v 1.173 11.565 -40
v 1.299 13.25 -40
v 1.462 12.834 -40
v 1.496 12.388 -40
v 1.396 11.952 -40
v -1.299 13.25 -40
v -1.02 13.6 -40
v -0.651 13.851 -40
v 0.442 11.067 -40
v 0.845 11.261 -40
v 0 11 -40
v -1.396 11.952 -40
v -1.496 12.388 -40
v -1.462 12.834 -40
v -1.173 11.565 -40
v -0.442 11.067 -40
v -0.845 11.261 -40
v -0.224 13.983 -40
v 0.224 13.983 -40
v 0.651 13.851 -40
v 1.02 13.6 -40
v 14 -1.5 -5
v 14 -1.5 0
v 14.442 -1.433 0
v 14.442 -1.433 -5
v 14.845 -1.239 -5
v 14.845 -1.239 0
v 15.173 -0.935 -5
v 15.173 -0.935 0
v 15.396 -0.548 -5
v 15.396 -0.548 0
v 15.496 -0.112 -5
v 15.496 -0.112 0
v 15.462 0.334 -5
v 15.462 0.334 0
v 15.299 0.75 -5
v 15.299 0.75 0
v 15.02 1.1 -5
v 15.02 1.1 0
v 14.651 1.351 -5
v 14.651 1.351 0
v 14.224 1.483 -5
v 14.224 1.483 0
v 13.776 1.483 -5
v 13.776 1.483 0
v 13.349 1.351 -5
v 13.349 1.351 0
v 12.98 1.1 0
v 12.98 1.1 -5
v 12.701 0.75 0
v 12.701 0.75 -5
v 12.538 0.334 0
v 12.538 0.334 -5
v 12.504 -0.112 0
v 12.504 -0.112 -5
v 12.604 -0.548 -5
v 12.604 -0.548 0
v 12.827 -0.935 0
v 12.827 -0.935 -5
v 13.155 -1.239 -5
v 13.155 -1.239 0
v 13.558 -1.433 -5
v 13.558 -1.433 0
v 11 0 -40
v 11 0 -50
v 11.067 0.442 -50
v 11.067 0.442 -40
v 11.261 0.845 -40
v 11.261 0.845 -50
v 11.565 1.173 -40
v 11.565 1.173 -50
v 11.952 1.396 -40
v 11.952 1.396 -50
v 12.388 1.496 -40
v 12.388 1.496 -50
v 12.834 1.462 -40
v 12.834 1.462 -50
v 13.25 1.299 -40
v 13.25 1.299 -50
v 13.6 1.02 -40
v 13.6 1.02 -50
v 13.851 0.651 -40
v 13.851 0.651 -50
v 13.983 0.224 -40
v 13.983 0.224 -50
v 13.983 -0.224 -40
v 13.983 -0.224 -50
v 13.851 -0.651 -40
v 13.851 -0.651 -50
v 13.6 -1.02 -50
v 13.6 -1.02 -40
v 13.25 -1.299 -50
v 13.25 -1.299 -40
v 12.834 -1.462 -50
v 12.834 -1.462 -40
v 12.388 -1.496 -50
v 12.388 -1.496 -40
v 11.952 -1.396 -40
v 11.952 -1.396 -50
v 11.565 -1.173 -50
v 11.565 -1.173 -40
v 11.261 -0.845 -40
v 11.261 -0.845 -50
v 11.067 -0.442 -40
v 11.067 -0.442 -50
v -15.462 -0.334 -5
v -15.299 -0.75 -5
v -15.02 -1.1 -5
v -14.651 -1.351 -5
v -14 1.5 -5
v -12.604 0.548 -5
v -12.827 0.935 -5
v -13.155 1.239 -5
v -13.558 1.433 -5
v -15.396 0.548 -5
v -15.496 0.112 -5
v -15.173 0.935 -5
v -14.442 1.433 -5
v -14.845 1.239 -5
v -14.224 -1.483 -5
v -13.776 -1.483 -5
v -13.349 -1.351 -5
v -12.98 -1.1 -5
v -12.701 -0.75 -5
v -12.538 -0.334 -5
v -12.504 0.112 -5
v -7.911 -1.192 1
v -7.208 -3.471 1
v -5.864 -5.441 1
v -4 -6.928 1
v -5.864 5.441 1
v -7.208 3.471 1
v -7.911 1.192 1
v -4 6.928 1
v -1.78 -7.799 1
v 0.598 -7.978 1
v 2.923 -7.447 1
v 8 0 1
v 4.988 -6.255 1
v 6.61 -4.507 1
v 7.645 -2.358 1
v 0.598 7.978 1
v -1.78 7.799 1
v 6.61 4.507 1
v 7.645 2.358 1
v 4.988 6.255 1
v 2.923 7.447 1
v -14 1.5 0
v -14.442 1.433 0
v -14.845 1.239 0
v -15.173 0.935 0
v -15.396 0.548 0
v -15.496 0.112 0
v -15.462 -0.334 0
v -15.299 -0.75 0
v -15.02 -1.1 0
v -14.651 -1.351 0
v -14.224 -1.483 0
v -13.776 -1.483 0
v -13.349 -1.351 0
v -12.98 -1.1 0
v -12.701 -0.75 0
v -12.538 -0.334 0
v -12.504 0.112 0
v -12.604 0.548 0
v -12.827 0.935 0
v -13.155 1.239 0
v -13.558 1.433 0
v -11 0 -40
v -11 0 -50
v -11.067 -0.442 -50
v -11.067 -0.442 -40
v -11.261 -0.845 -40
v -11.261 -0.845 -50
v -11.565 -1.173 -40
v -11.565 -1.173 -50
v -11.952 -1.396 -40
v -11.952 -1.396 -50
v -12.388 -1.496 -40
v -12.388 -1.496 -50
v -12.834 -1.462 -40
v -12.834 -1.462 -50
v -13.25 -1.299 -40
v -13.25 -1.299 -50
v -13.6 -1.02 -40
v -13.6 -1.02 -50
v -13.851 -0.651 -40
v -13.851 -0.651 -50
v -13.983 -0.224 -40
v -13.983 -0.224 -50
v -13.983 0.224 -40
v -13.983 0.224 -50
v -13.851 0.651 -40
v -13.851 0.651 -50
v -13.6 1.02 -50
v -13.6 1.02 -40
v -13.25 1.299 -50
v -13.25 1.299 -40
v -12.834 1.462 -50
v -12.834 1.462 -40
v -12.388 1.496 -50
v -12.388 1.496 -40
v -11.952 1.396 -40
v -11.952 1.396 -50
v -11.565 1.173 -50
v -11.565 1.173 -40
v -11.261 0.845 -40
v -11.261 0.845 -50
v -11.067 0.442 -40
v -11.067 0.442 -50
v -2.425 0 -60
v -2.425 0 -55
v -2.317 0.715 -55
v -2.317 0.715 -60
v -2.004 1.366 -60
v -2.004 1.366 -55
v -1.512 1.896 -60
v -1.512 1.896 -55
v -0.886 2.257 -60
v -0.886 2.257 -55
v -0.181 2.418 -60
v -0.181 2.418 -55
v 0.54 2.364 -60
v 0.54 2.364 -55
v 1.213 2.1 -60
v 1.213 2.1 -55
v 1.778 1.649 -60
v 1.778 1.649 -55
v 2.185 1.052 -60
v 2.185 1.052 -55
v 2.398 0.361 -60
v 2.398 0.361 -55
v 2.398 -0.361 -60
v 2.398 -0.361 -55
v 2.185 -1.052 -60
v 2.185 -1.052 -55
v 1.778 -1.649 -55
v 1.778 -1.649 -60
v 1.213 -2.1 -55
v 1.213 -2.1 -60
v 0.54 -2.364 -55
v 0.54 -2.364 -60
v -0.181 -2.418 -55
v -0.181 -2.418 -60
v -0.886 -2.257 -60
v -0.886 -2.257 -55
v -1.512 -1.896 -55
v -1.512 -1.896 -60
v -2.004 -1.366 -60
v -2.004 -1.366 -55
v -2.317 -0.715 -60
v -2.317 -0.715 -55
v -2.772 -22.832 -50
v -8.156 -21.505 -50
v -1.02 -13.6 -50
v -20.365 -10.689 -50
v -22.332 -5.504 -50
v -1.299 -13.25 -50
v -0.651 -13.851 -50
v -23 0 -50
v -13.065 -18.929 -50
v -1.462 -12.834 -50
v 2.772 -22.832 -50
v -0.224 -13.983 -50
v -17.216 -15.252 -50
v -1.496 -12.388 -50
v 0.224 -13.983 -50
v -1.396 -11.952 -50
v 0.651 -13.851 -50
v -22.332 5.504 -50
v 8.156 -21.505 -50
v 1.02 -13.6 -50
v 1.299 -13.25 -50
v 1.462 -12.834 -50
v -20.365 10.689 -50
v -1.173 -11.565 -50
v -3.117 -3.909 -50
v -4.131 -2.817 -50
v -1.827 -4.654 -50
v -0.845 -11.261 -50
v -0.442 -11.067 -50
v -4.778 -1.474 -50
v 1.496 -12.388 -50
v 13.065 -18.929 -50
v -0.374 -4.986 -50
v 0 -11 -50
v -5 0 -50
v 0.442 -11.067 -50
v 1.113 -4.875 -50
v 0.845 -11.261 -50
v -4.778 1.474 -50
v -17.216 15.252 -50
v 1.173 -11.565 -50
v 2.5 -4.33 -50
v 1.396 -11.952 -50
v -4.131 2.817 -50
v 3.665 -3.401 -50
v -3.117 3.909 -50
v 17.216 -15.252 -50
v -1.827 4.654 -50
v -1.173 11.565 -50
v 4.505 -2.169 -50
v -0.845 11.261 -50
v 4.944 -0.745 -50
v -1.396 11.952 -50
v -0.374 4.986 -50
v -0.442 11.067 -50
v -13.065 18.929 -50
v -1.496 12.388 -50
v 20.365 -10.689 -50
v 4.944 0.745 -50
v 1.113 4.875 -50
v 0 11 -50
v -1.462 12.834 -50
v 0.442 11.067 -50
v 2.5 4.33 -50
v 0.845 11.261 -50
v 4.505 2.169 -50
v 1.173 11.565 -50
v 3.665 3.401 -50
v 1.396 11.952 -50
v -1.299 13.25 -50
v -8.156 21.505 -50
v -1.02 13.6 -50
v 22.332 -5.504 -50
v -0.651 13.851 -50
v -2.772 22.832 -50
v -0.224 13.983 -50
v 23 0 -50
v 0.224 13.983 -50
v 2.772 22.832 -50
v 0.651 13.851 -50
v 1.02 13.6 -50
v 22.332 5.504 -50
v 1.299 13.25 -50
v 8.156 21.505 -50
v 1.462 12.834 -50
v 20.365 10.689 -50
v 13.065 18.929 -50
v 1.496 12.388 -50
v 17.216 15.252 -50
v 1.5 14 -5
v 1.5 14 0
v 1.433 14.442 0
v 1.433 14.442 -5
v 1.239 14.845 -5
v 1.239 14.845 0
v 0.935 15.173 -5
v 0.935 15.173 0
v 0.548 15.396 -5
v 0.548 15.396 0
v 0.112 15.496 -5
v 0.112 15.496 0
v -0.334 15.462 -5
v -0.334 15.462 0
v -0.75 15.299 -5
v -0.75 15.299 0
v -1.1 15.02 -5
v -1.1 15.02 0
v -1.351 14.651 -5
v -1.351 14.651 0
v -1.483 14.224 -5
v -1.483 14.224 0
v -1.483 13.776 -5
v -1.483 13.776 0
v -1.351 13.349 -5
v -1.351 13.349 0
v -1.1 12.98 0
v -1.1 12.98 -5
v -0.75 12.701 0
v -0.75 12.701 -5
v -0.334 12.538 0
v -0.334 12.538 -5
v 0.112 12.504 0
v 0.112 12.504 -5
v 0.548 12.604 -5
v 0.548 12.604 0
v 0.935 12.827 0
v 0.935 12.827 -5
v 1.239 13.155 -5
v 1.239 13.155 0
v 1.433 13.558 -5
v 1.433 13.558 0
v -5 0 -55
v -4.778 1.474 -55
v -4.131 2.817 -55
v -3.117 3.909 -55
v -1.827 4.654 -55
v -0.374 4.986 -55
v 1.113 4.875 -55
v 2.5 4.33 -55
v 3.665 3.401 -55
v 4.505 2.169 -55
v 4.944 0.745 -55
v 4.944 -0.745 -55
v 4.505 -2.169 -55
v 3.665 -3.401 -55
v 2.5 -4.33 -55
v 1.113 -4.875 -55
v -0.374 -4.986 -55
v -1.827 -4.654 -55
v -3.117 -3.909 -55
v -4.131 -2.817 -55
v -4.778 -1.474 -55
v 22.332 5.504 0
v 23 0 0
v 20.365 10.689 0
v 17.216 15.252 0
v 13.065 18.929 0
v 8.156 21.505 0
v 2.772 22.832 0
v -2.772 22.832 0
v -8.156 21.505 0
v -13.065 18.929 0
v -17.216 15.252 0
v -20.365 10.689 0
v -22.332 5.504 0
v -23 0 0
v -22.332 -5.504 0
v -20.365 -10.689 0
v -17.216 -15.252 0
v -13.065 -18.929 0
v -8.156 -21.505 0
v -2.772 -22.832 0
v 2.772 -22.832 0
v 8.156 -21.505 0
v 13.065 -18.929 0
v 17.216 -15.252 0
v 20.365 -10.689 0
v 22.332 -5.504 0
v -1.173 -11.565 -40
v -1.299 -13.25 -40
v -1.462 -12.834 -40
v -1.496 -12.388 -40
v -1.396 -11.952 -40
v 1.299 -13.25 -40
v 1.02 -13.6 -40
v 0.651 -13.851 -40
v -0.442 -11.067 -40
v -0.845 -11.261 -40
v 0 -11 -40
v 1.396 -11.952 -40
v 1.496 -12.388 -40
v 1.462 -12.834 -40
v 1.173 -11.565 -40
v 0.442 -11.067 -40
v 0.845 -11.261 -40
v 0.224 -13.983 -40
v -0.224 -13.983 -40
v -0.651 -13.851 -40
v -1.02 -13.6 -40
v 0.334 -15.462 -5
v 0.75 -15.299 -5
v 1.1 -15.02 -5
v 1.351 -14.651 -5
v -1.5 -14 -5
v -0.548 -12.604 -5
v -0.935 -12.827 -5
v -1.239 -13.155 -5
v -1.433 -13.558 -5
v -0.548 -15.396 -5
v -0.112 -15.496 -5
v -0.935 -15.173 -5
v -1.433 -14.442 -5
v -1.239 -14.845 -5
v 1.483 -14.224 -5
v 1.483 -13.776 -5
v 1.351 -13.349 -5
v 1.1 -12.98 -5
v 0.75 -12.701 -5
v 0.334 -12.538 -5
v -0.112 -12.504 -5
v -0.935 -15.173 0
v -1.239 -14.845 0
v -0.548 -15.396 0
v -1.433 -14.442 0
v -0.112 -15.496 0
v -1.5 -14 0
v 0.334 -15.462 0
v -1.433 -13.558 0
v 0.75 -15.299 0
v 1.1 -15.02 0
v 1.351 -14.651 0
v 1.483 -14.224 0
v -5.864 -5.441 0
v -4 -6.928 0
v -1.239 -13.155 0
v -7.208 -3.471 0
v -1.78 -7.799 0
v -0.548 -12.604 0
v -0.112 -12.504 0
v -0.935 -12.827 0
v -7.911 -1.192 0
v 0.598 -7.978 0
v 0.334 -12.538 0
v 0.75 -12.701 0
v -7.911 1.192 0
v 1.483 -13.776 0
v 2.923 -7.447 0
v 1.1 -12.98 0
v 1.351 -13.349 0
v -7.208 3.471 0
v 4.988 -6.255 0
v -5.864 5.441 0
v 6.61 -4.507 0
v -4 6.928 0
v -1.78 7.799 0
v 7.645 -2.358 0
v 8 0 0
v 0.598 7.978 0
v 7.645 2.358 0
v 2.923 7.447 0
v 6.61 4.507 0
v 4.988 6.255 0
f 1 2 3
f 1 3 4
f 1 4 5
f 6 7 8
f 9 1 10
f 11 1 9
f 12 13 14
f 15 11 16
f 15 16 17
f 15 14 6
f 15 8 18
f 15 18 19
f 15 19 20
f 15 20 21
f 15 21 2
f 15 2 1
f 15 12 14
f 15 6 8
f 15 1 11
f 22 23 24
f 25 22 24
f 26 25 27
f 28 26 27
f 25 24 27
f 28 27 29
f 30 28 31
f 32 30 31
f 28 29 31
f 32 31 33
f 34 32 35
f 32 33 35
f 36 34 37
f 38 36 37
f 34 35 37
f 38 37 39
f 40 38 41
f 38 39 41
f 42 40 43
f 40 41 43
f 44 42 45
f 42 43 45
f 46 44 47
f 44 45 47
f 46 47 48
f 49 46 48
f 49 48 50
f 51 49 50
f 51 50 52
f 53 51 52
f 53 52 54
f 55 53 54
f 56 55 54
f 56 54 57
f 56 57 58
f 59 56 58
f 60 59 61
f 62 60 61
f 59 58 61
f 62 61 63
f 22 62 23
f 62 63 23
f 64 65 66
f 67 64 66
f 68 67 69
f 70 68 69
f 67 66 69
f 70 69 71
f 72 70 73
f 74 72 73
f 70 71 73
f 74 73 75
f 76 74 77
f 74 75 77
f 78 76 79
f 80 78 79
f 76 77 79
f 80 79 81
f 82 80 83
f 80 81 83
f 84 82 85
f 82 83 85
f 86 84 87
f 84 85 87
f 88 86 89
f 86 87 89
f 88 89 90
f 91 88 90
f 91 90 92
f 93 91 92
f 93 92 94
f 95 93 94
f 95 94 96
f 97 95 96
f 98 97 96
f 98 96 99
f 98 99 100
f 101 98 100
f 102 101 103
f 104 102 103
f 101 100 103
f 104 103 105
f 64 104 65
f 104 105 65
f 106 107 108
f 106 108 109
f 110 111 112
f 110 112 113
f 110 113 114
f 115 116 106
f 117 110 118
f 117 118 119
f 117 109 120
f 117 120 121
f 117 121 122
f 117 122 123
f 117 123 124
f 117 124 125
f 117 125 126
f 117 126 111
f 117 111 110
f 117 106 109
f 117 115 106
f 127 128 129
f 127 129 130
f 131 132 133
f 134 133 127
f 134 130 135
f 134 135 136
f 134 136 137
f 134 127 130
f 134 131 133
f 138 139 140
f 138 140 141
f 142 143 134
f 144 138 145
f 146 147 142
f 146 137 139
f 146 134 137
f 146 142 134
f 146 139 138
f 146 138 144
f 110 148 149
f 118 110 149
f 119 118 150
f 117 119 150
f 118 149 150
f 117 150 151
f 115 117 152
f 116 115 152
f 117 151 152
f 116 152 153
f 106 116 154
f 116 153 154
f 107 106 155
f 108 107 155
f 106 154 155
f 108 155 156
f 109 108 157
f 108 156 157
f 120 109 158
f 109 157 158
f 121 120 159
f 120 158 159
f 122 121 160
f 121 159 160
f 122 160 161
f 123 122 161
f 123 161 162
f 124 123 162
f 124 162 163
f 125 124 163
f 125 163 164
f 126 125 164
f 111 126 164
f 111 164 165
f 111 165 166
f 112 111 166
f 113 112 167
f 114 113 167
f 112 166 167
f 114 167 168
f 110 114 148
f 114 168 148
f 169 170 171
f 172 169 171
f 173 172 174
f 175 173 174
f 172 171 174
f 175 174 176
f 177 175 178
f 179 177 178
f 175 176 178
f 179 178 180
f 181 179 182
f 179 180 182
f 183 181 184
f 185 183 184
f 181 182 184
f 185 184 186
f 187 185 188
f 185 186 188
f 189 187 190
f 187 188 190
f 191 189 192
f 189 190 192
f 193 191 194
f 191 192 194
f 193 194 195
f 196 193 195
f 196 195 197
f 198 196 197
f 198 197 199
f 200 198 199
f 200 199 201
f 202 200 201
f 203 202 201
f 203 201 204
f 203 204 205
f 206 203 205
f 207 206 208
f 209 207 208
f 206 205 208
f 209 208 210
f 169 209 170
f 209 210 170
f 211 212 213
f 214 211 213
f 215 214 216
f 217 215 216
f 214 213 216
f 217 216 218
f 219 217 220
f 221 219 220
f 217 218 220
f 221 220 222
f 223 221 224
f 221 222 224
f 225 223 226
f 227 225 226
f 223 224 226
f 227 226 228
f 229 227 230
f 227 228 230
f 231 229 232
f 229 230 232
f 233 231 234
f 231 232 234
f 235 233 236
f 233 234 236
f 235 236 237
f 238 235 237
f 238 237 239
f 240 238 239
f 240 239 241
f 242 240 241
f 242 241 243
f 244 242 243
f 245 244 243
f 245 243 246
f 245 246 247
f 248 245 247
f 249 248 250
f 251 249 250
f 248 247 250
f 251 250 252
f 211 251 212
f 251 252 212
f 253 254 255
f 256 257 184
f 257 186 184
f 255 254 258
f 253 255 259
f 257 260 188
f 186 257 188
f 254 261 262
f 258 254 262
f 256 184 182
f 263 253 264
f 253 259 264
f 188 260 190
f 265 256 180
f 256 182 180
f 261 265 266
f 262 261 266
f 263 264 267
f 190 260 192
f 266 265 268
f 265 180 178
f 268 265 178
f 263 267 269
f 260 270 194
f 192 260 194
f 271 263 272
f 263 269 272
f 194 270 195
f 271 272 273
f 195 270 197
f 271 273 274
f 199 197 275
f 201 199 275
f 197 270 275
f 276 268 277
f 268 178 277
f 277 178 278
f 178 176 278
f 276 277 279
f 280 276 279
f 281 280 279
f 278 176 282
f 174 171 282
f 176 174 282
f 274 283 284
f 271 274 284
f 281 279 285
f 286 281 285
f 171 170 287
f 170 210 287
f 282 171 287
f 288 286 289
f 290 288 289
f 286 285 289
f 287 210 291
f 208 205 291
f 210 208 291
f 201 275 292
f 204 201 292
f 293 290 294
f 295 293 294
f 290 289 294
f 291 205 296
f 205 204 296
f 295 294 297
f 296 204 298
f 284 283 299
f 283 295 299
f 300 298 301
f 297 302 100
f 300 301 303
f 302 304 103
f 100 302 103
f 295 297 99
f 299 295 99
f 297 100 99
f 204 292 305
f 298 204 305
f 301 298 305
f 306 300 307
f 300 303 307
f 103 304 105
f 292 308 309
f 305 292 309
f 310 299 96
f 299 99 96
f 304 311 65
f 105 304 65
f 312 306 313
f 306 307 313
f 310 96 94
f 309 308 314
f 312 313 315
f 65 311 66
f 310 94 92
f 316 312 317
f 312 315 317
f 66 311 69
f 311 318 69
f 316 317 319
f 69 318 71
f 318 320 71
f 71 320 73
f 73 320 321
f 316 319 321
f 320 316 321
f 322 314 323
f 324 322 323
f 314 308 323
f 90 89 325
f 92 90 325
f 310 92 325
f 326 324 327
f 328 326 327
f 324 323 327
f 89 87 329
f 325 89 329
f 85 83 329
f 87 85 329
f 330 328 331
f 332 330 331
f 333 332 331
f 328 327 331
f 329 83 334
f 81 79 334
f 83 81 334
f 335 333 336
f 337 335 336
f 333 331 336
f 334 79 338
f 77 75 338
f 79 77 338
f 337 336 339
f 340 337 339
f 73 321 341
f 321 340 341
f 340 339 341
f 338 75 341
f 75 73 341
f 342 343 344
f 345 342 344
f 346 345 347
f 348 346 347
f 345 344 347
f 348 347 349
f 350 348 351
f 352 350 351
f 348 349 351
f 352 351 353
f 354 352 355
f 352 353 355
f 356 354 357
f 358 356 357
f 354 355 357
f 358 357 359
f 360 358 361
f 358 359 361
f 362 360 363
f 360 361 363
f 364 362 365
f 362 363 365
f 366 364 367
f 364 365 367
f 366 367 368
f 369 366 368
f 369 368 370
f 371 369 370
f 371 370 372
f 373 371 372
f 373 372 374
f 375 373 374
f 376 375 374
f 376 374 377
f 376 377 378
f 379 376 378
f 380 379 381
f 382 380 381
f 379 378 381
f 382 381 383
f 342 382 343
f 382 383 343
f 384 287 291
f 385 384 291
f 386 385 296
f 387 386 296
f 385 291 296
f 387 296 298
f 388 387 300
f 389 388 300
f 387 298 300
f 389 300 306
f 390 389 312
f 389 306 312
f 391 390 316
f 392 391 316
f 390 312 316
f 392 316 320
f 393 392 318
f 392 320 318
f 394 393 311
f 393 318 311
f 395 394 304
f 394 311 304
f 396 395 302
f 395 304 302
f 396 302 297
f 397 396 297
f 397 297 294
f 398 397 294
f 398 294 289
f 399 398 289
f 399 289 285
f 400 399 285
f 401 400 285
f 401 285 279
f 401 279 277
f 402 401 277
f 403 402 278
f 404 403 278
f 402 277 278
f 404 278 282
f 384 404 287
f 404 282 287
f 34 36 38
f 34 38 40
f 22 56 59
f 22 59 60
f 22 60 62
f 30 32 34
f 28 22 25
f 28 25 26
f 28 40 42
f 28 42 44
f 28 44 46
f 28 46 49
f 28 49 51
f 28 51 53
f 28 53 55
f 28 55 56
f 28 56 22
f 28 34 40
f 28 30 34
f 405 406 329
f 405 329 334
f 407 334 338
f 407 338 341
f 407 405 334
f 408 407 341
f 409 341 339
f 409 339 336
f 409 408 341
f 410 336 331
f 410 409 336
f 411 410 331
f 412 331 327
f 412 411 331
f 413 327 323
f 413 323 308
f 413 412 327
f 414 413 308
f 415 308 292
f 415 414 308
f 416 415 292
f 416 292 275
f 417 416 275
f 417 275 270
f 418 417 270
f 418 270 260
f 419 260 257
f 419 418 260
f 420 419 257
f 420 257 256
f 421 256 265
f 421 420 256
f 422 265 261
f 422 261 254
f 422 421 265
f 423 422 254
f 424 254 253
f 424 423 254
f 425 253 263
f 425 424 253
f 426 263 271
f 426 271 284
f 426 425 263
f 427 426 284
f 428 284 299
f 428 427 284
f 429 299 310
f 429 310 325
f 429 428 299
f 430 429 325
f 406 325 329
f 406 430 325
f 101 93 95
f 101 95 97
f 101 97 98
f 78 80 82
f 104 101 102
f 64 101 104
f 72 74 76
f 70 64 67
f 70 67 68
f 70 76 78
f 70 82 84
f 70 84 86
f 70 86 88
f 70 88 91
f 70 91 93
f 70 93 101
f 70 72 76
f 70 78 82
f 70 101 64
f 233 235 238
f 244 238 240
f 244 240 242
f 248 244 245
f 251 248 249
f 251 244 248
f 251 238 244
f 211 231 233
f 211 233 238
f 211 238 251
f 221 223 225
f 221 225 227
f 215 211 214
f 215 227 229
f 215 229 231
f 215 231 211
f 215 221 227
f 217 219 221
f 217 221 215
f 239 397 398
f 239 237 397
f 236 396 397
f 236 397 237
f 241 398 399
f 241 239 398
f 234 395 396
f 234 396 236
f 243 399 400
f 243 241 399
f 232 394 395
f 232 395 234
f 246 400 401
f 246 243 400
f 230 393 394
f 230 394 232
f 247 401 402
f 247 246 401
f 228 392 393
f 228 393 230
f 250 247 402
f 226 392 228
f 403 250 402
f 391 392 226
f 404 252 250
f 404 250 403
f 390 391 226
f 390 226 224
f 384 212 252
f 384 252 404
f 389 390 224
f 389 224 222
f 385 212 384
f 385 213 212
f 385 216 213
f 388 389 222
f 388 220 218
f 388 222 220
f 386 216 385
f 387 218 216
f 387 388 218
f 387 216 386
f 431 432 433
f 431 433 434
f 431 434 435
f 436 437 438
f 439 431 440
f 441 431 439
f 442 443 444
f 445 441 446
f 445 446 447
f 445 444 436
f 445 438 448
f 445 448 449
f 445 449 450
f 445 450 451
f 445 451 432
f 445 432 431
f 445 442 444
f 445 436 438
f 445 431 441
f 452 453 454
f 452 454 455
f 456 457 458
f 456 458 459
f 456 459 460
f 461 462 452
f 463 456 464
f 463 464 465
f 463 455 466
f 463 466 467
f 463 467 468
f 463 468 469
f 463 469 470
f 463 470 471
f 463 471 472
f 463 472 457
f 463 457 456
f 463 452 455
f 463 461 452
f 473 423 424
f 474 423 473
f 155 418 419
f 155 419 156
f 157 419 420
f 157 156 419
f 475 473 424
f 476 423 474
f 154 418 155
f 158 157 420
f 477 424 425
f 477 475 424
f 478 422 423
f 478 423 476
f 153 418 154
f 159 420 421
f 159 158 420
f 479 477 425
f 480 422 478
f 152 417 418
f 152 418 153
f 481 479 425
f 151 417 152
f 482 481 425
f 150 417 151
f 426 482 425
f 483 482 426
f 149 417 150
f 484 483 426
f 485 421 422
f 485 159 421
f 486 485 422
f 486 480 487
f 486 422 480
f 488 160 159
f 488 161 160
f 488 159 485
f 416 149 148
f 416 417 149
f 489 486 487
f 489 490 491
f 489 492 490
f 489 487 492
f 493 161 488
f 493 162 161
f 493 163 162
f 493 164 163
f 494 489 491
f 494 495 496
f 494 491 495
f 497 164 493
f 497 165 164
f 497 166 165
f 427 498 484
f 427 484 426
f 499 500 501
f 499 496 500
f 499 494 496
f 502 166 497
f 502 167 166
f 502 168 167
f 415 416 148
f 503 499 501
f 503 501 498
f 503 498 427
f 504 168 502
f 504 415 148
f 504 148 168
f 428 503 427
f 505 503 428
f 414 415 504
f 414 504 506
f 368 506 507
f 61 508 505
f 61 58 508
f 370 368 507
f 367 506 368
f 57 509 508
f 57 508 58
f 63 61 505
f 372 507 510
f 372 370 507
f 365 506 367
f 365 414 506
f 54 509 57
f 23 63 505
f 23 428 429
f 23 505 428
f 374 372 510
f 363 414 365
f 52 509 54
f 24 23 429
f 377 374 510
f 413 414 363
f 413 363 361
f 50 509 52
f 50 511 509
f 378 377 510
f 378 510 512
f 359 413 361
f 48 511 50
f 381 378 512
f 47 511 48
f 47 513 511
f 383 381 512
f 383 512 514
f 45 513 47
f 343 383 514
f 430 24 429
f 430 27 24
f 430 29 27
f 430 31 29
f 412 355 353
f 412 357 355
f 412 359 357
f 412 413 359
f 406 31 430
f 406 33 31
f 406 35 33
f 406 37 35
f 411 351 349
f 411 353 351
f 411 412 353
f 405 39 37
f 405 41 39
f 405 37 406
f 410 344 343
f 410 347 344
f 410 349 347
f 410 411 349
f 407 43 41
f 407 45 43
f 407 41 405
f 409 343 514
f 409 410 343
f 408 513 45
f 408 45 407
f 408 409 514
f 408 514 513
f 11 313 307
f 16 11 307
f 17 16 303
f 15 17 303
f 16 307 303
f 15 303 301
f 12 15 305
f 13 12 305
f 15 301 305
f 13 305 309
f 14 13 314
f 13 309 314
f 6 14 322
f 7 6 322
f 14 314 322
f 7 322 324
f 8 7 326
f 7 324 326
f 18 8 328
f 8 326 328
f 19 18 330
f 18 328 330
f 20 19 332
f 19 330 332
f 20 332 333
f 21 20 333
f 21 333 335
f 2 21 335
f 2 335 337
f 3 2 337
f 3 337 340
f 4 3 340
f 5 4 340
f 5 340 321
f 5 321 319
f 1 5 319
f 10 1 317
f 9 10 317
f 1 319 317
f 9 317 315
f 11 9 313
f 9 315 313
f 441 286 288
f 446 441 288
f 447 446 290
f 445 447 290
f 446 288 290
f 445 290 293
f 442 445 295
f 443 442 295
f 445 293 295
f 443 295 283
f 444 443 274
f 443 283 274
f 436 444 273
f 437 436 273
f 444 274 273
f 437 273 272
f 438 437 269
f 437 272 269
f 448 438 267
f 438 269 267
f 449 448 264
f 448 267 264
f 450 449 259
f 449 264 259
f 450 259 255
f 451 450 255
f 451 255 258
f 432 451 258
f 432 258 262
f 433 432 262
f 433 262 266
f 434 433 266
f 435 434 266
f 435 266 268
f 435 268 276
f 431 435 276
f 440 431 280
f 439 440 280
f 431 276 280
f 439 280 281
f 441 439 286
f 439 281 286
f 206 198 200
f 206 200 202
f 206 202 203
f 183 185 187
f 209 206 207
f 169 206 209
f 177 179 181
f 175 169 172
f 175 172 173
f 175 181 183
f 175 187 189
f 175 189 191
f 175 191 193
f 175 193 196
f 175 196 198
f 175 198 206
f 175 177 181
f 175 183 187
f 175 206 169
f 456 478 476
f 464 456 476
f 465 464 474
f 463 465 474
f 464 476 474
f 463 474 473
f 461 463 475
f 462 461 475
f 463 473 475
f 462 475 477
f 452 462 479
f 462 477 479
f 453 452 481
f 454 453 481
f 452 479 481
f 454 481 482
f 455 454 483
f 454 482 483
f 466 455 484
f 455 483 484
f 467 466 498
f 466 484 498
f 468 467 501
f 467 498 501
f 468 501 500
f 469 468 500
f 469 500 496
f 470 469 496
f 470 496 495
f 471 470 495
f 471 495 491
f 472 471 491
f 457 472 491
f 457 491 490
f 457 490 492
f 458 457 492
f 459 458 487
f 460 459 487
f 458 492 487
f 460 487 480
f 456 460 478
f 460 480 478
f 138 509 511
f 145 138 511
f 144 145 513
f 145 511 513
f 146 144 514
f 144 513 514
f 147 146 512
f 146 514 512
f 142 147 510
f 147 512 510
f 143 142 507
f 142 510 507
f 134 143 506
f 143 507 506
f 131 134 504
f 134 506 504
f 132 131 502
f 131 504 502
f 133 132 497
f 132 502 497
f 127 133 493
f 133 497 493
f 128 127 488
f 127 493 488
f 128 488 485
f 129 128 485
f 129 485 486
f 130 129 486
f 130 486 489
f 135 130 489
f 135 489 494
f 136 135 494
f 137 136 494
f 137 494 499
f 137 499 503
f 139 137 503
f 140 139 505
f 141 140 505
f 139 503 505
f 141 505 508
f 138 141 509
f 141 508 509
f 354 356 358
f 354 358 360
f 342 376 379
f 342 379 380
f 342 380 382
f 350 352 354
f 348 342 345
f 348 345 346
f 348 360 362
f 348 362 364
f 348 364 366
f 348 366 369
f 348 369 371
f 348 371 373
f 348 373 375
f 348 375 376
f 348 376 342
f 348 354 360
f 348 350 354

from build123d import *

# Parameters (mm, degrees)
SKETCH1_R           = 23
BOSS_EXTRUDE1_DEPTH = 50
SKETCH2_R           = 8
BOSS_EXTRUDE2_DEPTH = 1
SKETCH5_R           = 1.5
CUT_EXTRUDE2_DEPTH  = 10
SKETCH6_R           = 1.5
CUT_EXTRUDE3_DEPTH  = 5
CIRPATTERN1_COUNT   = 4
CIRPATTERN2_COUNT   = 4
SKETCH7_R           = 5
BOSS_EXTRUDE3_DEPTH = 5
SKETCH8_R           = 2.425
BOSS_EXTRUDE4_DEPTH = 5


with BuildPart() as part:
    # Sketch1 → Boss-Extrude1 (new body)
    with BuildSketch(Plane.XY):
        Circle(SKETCH1_R)
    extrude(amount=-BOSS_EXTRUDE1_DEPTH)

    # Sketch2 → Boss-Extrude2 (add)
    with BuildSketch(Plane.XY):
        Circle(SKETCH2_R)
    extrude(amount=BOSS_EXTRUDE2_DEPTH)

    # Sketch5 → Cut-Extrude2 (cut)
    with BuildSketch(Plane(origin=(0, 0, -50), x_dir=(-1, 0, 0), z_dir=(0, 0, -1))):
        with Locations((-12.5, 0)):
            Circle(SKETCH5_R)
    cut_extrude2 = extrude(amount=-CUT_EXTRUDE2_DEPTH, mode=Mode.SUBTRACT)

    # Sketch6 → Cut-Extrude3 (cut)
    with BuildSketch(Plane.XY):
        with Locations((0, 14)):
            Circle(SKETCH6_R)
    cut_extrude3 = extrude(amount=-CUT_EXTRUDE3_DEPTH, mode=Mode.SUBTRACT)

    # CirPattern1: Cut-Extrude3 ×4 about axis
    cirpattern1_axis = Axis((0, 0, 0), (0, 0, 1))
    for i in range(1, CIRPATTERN1_COUNT):
        add(cut_extrude3.rotate(cirpattern1_axis, i * 360 / CIRPATTERN1_COUNT), mode=Mode.SUBTRACT)

    # CirPattern2: Cut-Extrude2 ×4 about axis
    cirpattern2_axis = Axis((0, 0, 0), (0, 0, 1))
    for i in range(1, CIRPATTERN2_COUNT):
        add(cut_extrude2.rotate(cirpattern2_axis, i * 360 / CIRPATTERN2_COUNT), mode=Mode.SUBTRACT)

    # Sketch7 → Boss-Extrude3 (add)
    with BuildSketch(Plane(origin=(0, 0, -50), x_dir=(-1, 0, 0), z_dir=(0, 0, -1))):
        Circle(SKETCH7_R)
    extrude(amount=BOSS_EXTRUDE3_DEPTH)

    # Sketch8 → Boss-Extrude4 (add)
    with BuildSketch(Plane(origin=(0, 0, -55), x_dir=(-1, 0, 0), z_dir=(0, 0, -1))):
        Circle(SKETCH8_R)
    extrude(amount=BOSS_EXTRUDE4_DEPTH)


solid = part.part
